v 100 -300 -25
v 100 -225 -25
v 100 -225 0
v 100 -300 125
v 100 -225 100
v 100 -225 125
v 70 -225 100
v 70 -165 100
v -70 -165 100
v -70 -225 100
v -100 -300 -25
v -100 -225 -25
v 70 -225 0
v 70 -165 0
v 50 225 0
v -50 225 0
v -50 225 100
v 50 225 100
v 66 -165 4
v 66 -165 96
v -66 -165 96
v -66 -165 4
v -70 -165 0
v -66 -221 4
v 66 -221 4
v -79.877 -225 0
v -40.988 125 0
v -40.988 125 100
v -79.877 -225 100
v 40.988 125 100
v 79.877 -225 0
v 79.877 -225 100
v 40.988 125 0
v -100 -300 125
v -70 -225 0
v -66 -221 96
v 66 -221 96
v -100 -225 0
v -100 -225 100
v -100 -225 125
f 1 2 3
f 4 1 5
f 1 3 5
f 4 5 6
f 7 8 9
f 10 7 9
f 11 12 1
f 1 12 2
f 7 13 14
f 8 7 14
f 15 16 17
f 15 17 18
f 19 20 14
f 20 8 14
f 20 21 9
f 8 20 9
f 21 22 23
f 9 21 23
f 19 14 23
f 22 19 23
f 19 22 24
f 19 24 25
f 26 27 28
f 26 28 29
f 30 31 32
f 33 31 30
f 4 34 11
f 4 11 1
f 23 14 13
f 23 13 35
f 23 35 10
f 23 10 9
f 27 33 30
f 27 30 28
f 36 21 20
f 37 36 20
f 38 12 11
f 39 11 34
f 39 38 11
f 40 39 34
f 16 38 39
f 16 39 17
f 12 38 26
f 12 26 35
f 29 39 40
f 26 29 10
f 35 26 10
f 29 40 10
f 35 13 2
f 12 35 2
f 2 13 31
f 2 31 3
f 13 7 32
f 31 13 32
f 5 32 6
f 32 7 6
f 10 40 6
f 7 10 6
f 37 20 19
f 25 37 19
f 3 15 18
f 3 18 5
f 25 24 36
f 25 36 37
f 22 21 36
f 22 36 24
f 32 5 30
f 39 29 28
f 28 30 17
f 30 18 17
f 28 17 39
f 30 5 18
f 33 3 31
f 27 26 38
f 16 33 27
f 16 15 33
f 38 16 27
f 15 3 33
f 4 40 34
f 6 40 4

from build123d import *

# Parameters (mm, degrees)
BOSS_EXTRUDE1_DEPTH = 100
SKETCH3_W           = 200
SKETCH3_H           = 150
BOSS_EXTRUDE2_DEPTH = 75
CUT_EXTRUDE2_DEPTH  = 126
SKETCH6_W           = 140
SKETCH6_H           = 60
BOSS_EXTRUDE3_DEPTH = 100
SKETCH7_W           = 132
SKETCH7_H           = 92
CUT_EXTRUDE3_DEPTH  = 56


with BuildPart() as part:
    # Sketch2 → Boss-Extrude1 (new body)
    with BuildSketch(Plane.XY):
        Polygon((-50, 225), (50, 225), (100, -225), (-100, -225), align=None)
    extrude(amount=BOSS_EXTRUDE1_DEPTH)

    # Sketch3 → Boss-Extrude2 (add)
    with BuildSketch(Plane.XZ.offset(225)):
        with Locations((0, 50)):
            Rectangle(SKETCH3_W, SKETCH3_H)
    extrude(amount=BOSS_EXTRUDE2_DEPTH)

    # Sketch5 → Cut-Extrude2 (cut, through all)
    with BuildSketch(Plane(origin=(0, 0, 0), x_dir=(-1, 0, 0), z_dir=(0, 0, -1))):
        Polygon((-40.988033026, 125), (40.988033026, 125), (79.876921915, -225), (-79.876921915, -225), align=None)
    extrude(amount=-CUT_EXTRUDE2_DEPTH, mode=Mode.SUBTRACT)

    # Sketch6 → Boss-Extrude3 (add)
    with BuildSketch(Plane(origin=(0, 0, 0), x_dir=(-1, 0, 0), z_dir=(0, 0, -1))):
        with Locations((0, -195)):
            Rectangle(SKETCH6_W, SKETCH6_H)
    extrude(amount=-BOSS_EXTRUDE3_DEPTH)

    # Sketch7 → Cut-Extrude3 (cut)
    with BuildSketch(Plane(origin=(0, -165, 0), x_dir=(1, 0, 0), z_dir=(0, 1, 0))):
        with Locations((0, -50)):
            Rectangle(SKETCH7_W, SKETCH7_H)
    extrude(amount=-CUT_EXTRUDE3_DEPTH, mode=Mode.SUBTRACT)


solid = part.part
